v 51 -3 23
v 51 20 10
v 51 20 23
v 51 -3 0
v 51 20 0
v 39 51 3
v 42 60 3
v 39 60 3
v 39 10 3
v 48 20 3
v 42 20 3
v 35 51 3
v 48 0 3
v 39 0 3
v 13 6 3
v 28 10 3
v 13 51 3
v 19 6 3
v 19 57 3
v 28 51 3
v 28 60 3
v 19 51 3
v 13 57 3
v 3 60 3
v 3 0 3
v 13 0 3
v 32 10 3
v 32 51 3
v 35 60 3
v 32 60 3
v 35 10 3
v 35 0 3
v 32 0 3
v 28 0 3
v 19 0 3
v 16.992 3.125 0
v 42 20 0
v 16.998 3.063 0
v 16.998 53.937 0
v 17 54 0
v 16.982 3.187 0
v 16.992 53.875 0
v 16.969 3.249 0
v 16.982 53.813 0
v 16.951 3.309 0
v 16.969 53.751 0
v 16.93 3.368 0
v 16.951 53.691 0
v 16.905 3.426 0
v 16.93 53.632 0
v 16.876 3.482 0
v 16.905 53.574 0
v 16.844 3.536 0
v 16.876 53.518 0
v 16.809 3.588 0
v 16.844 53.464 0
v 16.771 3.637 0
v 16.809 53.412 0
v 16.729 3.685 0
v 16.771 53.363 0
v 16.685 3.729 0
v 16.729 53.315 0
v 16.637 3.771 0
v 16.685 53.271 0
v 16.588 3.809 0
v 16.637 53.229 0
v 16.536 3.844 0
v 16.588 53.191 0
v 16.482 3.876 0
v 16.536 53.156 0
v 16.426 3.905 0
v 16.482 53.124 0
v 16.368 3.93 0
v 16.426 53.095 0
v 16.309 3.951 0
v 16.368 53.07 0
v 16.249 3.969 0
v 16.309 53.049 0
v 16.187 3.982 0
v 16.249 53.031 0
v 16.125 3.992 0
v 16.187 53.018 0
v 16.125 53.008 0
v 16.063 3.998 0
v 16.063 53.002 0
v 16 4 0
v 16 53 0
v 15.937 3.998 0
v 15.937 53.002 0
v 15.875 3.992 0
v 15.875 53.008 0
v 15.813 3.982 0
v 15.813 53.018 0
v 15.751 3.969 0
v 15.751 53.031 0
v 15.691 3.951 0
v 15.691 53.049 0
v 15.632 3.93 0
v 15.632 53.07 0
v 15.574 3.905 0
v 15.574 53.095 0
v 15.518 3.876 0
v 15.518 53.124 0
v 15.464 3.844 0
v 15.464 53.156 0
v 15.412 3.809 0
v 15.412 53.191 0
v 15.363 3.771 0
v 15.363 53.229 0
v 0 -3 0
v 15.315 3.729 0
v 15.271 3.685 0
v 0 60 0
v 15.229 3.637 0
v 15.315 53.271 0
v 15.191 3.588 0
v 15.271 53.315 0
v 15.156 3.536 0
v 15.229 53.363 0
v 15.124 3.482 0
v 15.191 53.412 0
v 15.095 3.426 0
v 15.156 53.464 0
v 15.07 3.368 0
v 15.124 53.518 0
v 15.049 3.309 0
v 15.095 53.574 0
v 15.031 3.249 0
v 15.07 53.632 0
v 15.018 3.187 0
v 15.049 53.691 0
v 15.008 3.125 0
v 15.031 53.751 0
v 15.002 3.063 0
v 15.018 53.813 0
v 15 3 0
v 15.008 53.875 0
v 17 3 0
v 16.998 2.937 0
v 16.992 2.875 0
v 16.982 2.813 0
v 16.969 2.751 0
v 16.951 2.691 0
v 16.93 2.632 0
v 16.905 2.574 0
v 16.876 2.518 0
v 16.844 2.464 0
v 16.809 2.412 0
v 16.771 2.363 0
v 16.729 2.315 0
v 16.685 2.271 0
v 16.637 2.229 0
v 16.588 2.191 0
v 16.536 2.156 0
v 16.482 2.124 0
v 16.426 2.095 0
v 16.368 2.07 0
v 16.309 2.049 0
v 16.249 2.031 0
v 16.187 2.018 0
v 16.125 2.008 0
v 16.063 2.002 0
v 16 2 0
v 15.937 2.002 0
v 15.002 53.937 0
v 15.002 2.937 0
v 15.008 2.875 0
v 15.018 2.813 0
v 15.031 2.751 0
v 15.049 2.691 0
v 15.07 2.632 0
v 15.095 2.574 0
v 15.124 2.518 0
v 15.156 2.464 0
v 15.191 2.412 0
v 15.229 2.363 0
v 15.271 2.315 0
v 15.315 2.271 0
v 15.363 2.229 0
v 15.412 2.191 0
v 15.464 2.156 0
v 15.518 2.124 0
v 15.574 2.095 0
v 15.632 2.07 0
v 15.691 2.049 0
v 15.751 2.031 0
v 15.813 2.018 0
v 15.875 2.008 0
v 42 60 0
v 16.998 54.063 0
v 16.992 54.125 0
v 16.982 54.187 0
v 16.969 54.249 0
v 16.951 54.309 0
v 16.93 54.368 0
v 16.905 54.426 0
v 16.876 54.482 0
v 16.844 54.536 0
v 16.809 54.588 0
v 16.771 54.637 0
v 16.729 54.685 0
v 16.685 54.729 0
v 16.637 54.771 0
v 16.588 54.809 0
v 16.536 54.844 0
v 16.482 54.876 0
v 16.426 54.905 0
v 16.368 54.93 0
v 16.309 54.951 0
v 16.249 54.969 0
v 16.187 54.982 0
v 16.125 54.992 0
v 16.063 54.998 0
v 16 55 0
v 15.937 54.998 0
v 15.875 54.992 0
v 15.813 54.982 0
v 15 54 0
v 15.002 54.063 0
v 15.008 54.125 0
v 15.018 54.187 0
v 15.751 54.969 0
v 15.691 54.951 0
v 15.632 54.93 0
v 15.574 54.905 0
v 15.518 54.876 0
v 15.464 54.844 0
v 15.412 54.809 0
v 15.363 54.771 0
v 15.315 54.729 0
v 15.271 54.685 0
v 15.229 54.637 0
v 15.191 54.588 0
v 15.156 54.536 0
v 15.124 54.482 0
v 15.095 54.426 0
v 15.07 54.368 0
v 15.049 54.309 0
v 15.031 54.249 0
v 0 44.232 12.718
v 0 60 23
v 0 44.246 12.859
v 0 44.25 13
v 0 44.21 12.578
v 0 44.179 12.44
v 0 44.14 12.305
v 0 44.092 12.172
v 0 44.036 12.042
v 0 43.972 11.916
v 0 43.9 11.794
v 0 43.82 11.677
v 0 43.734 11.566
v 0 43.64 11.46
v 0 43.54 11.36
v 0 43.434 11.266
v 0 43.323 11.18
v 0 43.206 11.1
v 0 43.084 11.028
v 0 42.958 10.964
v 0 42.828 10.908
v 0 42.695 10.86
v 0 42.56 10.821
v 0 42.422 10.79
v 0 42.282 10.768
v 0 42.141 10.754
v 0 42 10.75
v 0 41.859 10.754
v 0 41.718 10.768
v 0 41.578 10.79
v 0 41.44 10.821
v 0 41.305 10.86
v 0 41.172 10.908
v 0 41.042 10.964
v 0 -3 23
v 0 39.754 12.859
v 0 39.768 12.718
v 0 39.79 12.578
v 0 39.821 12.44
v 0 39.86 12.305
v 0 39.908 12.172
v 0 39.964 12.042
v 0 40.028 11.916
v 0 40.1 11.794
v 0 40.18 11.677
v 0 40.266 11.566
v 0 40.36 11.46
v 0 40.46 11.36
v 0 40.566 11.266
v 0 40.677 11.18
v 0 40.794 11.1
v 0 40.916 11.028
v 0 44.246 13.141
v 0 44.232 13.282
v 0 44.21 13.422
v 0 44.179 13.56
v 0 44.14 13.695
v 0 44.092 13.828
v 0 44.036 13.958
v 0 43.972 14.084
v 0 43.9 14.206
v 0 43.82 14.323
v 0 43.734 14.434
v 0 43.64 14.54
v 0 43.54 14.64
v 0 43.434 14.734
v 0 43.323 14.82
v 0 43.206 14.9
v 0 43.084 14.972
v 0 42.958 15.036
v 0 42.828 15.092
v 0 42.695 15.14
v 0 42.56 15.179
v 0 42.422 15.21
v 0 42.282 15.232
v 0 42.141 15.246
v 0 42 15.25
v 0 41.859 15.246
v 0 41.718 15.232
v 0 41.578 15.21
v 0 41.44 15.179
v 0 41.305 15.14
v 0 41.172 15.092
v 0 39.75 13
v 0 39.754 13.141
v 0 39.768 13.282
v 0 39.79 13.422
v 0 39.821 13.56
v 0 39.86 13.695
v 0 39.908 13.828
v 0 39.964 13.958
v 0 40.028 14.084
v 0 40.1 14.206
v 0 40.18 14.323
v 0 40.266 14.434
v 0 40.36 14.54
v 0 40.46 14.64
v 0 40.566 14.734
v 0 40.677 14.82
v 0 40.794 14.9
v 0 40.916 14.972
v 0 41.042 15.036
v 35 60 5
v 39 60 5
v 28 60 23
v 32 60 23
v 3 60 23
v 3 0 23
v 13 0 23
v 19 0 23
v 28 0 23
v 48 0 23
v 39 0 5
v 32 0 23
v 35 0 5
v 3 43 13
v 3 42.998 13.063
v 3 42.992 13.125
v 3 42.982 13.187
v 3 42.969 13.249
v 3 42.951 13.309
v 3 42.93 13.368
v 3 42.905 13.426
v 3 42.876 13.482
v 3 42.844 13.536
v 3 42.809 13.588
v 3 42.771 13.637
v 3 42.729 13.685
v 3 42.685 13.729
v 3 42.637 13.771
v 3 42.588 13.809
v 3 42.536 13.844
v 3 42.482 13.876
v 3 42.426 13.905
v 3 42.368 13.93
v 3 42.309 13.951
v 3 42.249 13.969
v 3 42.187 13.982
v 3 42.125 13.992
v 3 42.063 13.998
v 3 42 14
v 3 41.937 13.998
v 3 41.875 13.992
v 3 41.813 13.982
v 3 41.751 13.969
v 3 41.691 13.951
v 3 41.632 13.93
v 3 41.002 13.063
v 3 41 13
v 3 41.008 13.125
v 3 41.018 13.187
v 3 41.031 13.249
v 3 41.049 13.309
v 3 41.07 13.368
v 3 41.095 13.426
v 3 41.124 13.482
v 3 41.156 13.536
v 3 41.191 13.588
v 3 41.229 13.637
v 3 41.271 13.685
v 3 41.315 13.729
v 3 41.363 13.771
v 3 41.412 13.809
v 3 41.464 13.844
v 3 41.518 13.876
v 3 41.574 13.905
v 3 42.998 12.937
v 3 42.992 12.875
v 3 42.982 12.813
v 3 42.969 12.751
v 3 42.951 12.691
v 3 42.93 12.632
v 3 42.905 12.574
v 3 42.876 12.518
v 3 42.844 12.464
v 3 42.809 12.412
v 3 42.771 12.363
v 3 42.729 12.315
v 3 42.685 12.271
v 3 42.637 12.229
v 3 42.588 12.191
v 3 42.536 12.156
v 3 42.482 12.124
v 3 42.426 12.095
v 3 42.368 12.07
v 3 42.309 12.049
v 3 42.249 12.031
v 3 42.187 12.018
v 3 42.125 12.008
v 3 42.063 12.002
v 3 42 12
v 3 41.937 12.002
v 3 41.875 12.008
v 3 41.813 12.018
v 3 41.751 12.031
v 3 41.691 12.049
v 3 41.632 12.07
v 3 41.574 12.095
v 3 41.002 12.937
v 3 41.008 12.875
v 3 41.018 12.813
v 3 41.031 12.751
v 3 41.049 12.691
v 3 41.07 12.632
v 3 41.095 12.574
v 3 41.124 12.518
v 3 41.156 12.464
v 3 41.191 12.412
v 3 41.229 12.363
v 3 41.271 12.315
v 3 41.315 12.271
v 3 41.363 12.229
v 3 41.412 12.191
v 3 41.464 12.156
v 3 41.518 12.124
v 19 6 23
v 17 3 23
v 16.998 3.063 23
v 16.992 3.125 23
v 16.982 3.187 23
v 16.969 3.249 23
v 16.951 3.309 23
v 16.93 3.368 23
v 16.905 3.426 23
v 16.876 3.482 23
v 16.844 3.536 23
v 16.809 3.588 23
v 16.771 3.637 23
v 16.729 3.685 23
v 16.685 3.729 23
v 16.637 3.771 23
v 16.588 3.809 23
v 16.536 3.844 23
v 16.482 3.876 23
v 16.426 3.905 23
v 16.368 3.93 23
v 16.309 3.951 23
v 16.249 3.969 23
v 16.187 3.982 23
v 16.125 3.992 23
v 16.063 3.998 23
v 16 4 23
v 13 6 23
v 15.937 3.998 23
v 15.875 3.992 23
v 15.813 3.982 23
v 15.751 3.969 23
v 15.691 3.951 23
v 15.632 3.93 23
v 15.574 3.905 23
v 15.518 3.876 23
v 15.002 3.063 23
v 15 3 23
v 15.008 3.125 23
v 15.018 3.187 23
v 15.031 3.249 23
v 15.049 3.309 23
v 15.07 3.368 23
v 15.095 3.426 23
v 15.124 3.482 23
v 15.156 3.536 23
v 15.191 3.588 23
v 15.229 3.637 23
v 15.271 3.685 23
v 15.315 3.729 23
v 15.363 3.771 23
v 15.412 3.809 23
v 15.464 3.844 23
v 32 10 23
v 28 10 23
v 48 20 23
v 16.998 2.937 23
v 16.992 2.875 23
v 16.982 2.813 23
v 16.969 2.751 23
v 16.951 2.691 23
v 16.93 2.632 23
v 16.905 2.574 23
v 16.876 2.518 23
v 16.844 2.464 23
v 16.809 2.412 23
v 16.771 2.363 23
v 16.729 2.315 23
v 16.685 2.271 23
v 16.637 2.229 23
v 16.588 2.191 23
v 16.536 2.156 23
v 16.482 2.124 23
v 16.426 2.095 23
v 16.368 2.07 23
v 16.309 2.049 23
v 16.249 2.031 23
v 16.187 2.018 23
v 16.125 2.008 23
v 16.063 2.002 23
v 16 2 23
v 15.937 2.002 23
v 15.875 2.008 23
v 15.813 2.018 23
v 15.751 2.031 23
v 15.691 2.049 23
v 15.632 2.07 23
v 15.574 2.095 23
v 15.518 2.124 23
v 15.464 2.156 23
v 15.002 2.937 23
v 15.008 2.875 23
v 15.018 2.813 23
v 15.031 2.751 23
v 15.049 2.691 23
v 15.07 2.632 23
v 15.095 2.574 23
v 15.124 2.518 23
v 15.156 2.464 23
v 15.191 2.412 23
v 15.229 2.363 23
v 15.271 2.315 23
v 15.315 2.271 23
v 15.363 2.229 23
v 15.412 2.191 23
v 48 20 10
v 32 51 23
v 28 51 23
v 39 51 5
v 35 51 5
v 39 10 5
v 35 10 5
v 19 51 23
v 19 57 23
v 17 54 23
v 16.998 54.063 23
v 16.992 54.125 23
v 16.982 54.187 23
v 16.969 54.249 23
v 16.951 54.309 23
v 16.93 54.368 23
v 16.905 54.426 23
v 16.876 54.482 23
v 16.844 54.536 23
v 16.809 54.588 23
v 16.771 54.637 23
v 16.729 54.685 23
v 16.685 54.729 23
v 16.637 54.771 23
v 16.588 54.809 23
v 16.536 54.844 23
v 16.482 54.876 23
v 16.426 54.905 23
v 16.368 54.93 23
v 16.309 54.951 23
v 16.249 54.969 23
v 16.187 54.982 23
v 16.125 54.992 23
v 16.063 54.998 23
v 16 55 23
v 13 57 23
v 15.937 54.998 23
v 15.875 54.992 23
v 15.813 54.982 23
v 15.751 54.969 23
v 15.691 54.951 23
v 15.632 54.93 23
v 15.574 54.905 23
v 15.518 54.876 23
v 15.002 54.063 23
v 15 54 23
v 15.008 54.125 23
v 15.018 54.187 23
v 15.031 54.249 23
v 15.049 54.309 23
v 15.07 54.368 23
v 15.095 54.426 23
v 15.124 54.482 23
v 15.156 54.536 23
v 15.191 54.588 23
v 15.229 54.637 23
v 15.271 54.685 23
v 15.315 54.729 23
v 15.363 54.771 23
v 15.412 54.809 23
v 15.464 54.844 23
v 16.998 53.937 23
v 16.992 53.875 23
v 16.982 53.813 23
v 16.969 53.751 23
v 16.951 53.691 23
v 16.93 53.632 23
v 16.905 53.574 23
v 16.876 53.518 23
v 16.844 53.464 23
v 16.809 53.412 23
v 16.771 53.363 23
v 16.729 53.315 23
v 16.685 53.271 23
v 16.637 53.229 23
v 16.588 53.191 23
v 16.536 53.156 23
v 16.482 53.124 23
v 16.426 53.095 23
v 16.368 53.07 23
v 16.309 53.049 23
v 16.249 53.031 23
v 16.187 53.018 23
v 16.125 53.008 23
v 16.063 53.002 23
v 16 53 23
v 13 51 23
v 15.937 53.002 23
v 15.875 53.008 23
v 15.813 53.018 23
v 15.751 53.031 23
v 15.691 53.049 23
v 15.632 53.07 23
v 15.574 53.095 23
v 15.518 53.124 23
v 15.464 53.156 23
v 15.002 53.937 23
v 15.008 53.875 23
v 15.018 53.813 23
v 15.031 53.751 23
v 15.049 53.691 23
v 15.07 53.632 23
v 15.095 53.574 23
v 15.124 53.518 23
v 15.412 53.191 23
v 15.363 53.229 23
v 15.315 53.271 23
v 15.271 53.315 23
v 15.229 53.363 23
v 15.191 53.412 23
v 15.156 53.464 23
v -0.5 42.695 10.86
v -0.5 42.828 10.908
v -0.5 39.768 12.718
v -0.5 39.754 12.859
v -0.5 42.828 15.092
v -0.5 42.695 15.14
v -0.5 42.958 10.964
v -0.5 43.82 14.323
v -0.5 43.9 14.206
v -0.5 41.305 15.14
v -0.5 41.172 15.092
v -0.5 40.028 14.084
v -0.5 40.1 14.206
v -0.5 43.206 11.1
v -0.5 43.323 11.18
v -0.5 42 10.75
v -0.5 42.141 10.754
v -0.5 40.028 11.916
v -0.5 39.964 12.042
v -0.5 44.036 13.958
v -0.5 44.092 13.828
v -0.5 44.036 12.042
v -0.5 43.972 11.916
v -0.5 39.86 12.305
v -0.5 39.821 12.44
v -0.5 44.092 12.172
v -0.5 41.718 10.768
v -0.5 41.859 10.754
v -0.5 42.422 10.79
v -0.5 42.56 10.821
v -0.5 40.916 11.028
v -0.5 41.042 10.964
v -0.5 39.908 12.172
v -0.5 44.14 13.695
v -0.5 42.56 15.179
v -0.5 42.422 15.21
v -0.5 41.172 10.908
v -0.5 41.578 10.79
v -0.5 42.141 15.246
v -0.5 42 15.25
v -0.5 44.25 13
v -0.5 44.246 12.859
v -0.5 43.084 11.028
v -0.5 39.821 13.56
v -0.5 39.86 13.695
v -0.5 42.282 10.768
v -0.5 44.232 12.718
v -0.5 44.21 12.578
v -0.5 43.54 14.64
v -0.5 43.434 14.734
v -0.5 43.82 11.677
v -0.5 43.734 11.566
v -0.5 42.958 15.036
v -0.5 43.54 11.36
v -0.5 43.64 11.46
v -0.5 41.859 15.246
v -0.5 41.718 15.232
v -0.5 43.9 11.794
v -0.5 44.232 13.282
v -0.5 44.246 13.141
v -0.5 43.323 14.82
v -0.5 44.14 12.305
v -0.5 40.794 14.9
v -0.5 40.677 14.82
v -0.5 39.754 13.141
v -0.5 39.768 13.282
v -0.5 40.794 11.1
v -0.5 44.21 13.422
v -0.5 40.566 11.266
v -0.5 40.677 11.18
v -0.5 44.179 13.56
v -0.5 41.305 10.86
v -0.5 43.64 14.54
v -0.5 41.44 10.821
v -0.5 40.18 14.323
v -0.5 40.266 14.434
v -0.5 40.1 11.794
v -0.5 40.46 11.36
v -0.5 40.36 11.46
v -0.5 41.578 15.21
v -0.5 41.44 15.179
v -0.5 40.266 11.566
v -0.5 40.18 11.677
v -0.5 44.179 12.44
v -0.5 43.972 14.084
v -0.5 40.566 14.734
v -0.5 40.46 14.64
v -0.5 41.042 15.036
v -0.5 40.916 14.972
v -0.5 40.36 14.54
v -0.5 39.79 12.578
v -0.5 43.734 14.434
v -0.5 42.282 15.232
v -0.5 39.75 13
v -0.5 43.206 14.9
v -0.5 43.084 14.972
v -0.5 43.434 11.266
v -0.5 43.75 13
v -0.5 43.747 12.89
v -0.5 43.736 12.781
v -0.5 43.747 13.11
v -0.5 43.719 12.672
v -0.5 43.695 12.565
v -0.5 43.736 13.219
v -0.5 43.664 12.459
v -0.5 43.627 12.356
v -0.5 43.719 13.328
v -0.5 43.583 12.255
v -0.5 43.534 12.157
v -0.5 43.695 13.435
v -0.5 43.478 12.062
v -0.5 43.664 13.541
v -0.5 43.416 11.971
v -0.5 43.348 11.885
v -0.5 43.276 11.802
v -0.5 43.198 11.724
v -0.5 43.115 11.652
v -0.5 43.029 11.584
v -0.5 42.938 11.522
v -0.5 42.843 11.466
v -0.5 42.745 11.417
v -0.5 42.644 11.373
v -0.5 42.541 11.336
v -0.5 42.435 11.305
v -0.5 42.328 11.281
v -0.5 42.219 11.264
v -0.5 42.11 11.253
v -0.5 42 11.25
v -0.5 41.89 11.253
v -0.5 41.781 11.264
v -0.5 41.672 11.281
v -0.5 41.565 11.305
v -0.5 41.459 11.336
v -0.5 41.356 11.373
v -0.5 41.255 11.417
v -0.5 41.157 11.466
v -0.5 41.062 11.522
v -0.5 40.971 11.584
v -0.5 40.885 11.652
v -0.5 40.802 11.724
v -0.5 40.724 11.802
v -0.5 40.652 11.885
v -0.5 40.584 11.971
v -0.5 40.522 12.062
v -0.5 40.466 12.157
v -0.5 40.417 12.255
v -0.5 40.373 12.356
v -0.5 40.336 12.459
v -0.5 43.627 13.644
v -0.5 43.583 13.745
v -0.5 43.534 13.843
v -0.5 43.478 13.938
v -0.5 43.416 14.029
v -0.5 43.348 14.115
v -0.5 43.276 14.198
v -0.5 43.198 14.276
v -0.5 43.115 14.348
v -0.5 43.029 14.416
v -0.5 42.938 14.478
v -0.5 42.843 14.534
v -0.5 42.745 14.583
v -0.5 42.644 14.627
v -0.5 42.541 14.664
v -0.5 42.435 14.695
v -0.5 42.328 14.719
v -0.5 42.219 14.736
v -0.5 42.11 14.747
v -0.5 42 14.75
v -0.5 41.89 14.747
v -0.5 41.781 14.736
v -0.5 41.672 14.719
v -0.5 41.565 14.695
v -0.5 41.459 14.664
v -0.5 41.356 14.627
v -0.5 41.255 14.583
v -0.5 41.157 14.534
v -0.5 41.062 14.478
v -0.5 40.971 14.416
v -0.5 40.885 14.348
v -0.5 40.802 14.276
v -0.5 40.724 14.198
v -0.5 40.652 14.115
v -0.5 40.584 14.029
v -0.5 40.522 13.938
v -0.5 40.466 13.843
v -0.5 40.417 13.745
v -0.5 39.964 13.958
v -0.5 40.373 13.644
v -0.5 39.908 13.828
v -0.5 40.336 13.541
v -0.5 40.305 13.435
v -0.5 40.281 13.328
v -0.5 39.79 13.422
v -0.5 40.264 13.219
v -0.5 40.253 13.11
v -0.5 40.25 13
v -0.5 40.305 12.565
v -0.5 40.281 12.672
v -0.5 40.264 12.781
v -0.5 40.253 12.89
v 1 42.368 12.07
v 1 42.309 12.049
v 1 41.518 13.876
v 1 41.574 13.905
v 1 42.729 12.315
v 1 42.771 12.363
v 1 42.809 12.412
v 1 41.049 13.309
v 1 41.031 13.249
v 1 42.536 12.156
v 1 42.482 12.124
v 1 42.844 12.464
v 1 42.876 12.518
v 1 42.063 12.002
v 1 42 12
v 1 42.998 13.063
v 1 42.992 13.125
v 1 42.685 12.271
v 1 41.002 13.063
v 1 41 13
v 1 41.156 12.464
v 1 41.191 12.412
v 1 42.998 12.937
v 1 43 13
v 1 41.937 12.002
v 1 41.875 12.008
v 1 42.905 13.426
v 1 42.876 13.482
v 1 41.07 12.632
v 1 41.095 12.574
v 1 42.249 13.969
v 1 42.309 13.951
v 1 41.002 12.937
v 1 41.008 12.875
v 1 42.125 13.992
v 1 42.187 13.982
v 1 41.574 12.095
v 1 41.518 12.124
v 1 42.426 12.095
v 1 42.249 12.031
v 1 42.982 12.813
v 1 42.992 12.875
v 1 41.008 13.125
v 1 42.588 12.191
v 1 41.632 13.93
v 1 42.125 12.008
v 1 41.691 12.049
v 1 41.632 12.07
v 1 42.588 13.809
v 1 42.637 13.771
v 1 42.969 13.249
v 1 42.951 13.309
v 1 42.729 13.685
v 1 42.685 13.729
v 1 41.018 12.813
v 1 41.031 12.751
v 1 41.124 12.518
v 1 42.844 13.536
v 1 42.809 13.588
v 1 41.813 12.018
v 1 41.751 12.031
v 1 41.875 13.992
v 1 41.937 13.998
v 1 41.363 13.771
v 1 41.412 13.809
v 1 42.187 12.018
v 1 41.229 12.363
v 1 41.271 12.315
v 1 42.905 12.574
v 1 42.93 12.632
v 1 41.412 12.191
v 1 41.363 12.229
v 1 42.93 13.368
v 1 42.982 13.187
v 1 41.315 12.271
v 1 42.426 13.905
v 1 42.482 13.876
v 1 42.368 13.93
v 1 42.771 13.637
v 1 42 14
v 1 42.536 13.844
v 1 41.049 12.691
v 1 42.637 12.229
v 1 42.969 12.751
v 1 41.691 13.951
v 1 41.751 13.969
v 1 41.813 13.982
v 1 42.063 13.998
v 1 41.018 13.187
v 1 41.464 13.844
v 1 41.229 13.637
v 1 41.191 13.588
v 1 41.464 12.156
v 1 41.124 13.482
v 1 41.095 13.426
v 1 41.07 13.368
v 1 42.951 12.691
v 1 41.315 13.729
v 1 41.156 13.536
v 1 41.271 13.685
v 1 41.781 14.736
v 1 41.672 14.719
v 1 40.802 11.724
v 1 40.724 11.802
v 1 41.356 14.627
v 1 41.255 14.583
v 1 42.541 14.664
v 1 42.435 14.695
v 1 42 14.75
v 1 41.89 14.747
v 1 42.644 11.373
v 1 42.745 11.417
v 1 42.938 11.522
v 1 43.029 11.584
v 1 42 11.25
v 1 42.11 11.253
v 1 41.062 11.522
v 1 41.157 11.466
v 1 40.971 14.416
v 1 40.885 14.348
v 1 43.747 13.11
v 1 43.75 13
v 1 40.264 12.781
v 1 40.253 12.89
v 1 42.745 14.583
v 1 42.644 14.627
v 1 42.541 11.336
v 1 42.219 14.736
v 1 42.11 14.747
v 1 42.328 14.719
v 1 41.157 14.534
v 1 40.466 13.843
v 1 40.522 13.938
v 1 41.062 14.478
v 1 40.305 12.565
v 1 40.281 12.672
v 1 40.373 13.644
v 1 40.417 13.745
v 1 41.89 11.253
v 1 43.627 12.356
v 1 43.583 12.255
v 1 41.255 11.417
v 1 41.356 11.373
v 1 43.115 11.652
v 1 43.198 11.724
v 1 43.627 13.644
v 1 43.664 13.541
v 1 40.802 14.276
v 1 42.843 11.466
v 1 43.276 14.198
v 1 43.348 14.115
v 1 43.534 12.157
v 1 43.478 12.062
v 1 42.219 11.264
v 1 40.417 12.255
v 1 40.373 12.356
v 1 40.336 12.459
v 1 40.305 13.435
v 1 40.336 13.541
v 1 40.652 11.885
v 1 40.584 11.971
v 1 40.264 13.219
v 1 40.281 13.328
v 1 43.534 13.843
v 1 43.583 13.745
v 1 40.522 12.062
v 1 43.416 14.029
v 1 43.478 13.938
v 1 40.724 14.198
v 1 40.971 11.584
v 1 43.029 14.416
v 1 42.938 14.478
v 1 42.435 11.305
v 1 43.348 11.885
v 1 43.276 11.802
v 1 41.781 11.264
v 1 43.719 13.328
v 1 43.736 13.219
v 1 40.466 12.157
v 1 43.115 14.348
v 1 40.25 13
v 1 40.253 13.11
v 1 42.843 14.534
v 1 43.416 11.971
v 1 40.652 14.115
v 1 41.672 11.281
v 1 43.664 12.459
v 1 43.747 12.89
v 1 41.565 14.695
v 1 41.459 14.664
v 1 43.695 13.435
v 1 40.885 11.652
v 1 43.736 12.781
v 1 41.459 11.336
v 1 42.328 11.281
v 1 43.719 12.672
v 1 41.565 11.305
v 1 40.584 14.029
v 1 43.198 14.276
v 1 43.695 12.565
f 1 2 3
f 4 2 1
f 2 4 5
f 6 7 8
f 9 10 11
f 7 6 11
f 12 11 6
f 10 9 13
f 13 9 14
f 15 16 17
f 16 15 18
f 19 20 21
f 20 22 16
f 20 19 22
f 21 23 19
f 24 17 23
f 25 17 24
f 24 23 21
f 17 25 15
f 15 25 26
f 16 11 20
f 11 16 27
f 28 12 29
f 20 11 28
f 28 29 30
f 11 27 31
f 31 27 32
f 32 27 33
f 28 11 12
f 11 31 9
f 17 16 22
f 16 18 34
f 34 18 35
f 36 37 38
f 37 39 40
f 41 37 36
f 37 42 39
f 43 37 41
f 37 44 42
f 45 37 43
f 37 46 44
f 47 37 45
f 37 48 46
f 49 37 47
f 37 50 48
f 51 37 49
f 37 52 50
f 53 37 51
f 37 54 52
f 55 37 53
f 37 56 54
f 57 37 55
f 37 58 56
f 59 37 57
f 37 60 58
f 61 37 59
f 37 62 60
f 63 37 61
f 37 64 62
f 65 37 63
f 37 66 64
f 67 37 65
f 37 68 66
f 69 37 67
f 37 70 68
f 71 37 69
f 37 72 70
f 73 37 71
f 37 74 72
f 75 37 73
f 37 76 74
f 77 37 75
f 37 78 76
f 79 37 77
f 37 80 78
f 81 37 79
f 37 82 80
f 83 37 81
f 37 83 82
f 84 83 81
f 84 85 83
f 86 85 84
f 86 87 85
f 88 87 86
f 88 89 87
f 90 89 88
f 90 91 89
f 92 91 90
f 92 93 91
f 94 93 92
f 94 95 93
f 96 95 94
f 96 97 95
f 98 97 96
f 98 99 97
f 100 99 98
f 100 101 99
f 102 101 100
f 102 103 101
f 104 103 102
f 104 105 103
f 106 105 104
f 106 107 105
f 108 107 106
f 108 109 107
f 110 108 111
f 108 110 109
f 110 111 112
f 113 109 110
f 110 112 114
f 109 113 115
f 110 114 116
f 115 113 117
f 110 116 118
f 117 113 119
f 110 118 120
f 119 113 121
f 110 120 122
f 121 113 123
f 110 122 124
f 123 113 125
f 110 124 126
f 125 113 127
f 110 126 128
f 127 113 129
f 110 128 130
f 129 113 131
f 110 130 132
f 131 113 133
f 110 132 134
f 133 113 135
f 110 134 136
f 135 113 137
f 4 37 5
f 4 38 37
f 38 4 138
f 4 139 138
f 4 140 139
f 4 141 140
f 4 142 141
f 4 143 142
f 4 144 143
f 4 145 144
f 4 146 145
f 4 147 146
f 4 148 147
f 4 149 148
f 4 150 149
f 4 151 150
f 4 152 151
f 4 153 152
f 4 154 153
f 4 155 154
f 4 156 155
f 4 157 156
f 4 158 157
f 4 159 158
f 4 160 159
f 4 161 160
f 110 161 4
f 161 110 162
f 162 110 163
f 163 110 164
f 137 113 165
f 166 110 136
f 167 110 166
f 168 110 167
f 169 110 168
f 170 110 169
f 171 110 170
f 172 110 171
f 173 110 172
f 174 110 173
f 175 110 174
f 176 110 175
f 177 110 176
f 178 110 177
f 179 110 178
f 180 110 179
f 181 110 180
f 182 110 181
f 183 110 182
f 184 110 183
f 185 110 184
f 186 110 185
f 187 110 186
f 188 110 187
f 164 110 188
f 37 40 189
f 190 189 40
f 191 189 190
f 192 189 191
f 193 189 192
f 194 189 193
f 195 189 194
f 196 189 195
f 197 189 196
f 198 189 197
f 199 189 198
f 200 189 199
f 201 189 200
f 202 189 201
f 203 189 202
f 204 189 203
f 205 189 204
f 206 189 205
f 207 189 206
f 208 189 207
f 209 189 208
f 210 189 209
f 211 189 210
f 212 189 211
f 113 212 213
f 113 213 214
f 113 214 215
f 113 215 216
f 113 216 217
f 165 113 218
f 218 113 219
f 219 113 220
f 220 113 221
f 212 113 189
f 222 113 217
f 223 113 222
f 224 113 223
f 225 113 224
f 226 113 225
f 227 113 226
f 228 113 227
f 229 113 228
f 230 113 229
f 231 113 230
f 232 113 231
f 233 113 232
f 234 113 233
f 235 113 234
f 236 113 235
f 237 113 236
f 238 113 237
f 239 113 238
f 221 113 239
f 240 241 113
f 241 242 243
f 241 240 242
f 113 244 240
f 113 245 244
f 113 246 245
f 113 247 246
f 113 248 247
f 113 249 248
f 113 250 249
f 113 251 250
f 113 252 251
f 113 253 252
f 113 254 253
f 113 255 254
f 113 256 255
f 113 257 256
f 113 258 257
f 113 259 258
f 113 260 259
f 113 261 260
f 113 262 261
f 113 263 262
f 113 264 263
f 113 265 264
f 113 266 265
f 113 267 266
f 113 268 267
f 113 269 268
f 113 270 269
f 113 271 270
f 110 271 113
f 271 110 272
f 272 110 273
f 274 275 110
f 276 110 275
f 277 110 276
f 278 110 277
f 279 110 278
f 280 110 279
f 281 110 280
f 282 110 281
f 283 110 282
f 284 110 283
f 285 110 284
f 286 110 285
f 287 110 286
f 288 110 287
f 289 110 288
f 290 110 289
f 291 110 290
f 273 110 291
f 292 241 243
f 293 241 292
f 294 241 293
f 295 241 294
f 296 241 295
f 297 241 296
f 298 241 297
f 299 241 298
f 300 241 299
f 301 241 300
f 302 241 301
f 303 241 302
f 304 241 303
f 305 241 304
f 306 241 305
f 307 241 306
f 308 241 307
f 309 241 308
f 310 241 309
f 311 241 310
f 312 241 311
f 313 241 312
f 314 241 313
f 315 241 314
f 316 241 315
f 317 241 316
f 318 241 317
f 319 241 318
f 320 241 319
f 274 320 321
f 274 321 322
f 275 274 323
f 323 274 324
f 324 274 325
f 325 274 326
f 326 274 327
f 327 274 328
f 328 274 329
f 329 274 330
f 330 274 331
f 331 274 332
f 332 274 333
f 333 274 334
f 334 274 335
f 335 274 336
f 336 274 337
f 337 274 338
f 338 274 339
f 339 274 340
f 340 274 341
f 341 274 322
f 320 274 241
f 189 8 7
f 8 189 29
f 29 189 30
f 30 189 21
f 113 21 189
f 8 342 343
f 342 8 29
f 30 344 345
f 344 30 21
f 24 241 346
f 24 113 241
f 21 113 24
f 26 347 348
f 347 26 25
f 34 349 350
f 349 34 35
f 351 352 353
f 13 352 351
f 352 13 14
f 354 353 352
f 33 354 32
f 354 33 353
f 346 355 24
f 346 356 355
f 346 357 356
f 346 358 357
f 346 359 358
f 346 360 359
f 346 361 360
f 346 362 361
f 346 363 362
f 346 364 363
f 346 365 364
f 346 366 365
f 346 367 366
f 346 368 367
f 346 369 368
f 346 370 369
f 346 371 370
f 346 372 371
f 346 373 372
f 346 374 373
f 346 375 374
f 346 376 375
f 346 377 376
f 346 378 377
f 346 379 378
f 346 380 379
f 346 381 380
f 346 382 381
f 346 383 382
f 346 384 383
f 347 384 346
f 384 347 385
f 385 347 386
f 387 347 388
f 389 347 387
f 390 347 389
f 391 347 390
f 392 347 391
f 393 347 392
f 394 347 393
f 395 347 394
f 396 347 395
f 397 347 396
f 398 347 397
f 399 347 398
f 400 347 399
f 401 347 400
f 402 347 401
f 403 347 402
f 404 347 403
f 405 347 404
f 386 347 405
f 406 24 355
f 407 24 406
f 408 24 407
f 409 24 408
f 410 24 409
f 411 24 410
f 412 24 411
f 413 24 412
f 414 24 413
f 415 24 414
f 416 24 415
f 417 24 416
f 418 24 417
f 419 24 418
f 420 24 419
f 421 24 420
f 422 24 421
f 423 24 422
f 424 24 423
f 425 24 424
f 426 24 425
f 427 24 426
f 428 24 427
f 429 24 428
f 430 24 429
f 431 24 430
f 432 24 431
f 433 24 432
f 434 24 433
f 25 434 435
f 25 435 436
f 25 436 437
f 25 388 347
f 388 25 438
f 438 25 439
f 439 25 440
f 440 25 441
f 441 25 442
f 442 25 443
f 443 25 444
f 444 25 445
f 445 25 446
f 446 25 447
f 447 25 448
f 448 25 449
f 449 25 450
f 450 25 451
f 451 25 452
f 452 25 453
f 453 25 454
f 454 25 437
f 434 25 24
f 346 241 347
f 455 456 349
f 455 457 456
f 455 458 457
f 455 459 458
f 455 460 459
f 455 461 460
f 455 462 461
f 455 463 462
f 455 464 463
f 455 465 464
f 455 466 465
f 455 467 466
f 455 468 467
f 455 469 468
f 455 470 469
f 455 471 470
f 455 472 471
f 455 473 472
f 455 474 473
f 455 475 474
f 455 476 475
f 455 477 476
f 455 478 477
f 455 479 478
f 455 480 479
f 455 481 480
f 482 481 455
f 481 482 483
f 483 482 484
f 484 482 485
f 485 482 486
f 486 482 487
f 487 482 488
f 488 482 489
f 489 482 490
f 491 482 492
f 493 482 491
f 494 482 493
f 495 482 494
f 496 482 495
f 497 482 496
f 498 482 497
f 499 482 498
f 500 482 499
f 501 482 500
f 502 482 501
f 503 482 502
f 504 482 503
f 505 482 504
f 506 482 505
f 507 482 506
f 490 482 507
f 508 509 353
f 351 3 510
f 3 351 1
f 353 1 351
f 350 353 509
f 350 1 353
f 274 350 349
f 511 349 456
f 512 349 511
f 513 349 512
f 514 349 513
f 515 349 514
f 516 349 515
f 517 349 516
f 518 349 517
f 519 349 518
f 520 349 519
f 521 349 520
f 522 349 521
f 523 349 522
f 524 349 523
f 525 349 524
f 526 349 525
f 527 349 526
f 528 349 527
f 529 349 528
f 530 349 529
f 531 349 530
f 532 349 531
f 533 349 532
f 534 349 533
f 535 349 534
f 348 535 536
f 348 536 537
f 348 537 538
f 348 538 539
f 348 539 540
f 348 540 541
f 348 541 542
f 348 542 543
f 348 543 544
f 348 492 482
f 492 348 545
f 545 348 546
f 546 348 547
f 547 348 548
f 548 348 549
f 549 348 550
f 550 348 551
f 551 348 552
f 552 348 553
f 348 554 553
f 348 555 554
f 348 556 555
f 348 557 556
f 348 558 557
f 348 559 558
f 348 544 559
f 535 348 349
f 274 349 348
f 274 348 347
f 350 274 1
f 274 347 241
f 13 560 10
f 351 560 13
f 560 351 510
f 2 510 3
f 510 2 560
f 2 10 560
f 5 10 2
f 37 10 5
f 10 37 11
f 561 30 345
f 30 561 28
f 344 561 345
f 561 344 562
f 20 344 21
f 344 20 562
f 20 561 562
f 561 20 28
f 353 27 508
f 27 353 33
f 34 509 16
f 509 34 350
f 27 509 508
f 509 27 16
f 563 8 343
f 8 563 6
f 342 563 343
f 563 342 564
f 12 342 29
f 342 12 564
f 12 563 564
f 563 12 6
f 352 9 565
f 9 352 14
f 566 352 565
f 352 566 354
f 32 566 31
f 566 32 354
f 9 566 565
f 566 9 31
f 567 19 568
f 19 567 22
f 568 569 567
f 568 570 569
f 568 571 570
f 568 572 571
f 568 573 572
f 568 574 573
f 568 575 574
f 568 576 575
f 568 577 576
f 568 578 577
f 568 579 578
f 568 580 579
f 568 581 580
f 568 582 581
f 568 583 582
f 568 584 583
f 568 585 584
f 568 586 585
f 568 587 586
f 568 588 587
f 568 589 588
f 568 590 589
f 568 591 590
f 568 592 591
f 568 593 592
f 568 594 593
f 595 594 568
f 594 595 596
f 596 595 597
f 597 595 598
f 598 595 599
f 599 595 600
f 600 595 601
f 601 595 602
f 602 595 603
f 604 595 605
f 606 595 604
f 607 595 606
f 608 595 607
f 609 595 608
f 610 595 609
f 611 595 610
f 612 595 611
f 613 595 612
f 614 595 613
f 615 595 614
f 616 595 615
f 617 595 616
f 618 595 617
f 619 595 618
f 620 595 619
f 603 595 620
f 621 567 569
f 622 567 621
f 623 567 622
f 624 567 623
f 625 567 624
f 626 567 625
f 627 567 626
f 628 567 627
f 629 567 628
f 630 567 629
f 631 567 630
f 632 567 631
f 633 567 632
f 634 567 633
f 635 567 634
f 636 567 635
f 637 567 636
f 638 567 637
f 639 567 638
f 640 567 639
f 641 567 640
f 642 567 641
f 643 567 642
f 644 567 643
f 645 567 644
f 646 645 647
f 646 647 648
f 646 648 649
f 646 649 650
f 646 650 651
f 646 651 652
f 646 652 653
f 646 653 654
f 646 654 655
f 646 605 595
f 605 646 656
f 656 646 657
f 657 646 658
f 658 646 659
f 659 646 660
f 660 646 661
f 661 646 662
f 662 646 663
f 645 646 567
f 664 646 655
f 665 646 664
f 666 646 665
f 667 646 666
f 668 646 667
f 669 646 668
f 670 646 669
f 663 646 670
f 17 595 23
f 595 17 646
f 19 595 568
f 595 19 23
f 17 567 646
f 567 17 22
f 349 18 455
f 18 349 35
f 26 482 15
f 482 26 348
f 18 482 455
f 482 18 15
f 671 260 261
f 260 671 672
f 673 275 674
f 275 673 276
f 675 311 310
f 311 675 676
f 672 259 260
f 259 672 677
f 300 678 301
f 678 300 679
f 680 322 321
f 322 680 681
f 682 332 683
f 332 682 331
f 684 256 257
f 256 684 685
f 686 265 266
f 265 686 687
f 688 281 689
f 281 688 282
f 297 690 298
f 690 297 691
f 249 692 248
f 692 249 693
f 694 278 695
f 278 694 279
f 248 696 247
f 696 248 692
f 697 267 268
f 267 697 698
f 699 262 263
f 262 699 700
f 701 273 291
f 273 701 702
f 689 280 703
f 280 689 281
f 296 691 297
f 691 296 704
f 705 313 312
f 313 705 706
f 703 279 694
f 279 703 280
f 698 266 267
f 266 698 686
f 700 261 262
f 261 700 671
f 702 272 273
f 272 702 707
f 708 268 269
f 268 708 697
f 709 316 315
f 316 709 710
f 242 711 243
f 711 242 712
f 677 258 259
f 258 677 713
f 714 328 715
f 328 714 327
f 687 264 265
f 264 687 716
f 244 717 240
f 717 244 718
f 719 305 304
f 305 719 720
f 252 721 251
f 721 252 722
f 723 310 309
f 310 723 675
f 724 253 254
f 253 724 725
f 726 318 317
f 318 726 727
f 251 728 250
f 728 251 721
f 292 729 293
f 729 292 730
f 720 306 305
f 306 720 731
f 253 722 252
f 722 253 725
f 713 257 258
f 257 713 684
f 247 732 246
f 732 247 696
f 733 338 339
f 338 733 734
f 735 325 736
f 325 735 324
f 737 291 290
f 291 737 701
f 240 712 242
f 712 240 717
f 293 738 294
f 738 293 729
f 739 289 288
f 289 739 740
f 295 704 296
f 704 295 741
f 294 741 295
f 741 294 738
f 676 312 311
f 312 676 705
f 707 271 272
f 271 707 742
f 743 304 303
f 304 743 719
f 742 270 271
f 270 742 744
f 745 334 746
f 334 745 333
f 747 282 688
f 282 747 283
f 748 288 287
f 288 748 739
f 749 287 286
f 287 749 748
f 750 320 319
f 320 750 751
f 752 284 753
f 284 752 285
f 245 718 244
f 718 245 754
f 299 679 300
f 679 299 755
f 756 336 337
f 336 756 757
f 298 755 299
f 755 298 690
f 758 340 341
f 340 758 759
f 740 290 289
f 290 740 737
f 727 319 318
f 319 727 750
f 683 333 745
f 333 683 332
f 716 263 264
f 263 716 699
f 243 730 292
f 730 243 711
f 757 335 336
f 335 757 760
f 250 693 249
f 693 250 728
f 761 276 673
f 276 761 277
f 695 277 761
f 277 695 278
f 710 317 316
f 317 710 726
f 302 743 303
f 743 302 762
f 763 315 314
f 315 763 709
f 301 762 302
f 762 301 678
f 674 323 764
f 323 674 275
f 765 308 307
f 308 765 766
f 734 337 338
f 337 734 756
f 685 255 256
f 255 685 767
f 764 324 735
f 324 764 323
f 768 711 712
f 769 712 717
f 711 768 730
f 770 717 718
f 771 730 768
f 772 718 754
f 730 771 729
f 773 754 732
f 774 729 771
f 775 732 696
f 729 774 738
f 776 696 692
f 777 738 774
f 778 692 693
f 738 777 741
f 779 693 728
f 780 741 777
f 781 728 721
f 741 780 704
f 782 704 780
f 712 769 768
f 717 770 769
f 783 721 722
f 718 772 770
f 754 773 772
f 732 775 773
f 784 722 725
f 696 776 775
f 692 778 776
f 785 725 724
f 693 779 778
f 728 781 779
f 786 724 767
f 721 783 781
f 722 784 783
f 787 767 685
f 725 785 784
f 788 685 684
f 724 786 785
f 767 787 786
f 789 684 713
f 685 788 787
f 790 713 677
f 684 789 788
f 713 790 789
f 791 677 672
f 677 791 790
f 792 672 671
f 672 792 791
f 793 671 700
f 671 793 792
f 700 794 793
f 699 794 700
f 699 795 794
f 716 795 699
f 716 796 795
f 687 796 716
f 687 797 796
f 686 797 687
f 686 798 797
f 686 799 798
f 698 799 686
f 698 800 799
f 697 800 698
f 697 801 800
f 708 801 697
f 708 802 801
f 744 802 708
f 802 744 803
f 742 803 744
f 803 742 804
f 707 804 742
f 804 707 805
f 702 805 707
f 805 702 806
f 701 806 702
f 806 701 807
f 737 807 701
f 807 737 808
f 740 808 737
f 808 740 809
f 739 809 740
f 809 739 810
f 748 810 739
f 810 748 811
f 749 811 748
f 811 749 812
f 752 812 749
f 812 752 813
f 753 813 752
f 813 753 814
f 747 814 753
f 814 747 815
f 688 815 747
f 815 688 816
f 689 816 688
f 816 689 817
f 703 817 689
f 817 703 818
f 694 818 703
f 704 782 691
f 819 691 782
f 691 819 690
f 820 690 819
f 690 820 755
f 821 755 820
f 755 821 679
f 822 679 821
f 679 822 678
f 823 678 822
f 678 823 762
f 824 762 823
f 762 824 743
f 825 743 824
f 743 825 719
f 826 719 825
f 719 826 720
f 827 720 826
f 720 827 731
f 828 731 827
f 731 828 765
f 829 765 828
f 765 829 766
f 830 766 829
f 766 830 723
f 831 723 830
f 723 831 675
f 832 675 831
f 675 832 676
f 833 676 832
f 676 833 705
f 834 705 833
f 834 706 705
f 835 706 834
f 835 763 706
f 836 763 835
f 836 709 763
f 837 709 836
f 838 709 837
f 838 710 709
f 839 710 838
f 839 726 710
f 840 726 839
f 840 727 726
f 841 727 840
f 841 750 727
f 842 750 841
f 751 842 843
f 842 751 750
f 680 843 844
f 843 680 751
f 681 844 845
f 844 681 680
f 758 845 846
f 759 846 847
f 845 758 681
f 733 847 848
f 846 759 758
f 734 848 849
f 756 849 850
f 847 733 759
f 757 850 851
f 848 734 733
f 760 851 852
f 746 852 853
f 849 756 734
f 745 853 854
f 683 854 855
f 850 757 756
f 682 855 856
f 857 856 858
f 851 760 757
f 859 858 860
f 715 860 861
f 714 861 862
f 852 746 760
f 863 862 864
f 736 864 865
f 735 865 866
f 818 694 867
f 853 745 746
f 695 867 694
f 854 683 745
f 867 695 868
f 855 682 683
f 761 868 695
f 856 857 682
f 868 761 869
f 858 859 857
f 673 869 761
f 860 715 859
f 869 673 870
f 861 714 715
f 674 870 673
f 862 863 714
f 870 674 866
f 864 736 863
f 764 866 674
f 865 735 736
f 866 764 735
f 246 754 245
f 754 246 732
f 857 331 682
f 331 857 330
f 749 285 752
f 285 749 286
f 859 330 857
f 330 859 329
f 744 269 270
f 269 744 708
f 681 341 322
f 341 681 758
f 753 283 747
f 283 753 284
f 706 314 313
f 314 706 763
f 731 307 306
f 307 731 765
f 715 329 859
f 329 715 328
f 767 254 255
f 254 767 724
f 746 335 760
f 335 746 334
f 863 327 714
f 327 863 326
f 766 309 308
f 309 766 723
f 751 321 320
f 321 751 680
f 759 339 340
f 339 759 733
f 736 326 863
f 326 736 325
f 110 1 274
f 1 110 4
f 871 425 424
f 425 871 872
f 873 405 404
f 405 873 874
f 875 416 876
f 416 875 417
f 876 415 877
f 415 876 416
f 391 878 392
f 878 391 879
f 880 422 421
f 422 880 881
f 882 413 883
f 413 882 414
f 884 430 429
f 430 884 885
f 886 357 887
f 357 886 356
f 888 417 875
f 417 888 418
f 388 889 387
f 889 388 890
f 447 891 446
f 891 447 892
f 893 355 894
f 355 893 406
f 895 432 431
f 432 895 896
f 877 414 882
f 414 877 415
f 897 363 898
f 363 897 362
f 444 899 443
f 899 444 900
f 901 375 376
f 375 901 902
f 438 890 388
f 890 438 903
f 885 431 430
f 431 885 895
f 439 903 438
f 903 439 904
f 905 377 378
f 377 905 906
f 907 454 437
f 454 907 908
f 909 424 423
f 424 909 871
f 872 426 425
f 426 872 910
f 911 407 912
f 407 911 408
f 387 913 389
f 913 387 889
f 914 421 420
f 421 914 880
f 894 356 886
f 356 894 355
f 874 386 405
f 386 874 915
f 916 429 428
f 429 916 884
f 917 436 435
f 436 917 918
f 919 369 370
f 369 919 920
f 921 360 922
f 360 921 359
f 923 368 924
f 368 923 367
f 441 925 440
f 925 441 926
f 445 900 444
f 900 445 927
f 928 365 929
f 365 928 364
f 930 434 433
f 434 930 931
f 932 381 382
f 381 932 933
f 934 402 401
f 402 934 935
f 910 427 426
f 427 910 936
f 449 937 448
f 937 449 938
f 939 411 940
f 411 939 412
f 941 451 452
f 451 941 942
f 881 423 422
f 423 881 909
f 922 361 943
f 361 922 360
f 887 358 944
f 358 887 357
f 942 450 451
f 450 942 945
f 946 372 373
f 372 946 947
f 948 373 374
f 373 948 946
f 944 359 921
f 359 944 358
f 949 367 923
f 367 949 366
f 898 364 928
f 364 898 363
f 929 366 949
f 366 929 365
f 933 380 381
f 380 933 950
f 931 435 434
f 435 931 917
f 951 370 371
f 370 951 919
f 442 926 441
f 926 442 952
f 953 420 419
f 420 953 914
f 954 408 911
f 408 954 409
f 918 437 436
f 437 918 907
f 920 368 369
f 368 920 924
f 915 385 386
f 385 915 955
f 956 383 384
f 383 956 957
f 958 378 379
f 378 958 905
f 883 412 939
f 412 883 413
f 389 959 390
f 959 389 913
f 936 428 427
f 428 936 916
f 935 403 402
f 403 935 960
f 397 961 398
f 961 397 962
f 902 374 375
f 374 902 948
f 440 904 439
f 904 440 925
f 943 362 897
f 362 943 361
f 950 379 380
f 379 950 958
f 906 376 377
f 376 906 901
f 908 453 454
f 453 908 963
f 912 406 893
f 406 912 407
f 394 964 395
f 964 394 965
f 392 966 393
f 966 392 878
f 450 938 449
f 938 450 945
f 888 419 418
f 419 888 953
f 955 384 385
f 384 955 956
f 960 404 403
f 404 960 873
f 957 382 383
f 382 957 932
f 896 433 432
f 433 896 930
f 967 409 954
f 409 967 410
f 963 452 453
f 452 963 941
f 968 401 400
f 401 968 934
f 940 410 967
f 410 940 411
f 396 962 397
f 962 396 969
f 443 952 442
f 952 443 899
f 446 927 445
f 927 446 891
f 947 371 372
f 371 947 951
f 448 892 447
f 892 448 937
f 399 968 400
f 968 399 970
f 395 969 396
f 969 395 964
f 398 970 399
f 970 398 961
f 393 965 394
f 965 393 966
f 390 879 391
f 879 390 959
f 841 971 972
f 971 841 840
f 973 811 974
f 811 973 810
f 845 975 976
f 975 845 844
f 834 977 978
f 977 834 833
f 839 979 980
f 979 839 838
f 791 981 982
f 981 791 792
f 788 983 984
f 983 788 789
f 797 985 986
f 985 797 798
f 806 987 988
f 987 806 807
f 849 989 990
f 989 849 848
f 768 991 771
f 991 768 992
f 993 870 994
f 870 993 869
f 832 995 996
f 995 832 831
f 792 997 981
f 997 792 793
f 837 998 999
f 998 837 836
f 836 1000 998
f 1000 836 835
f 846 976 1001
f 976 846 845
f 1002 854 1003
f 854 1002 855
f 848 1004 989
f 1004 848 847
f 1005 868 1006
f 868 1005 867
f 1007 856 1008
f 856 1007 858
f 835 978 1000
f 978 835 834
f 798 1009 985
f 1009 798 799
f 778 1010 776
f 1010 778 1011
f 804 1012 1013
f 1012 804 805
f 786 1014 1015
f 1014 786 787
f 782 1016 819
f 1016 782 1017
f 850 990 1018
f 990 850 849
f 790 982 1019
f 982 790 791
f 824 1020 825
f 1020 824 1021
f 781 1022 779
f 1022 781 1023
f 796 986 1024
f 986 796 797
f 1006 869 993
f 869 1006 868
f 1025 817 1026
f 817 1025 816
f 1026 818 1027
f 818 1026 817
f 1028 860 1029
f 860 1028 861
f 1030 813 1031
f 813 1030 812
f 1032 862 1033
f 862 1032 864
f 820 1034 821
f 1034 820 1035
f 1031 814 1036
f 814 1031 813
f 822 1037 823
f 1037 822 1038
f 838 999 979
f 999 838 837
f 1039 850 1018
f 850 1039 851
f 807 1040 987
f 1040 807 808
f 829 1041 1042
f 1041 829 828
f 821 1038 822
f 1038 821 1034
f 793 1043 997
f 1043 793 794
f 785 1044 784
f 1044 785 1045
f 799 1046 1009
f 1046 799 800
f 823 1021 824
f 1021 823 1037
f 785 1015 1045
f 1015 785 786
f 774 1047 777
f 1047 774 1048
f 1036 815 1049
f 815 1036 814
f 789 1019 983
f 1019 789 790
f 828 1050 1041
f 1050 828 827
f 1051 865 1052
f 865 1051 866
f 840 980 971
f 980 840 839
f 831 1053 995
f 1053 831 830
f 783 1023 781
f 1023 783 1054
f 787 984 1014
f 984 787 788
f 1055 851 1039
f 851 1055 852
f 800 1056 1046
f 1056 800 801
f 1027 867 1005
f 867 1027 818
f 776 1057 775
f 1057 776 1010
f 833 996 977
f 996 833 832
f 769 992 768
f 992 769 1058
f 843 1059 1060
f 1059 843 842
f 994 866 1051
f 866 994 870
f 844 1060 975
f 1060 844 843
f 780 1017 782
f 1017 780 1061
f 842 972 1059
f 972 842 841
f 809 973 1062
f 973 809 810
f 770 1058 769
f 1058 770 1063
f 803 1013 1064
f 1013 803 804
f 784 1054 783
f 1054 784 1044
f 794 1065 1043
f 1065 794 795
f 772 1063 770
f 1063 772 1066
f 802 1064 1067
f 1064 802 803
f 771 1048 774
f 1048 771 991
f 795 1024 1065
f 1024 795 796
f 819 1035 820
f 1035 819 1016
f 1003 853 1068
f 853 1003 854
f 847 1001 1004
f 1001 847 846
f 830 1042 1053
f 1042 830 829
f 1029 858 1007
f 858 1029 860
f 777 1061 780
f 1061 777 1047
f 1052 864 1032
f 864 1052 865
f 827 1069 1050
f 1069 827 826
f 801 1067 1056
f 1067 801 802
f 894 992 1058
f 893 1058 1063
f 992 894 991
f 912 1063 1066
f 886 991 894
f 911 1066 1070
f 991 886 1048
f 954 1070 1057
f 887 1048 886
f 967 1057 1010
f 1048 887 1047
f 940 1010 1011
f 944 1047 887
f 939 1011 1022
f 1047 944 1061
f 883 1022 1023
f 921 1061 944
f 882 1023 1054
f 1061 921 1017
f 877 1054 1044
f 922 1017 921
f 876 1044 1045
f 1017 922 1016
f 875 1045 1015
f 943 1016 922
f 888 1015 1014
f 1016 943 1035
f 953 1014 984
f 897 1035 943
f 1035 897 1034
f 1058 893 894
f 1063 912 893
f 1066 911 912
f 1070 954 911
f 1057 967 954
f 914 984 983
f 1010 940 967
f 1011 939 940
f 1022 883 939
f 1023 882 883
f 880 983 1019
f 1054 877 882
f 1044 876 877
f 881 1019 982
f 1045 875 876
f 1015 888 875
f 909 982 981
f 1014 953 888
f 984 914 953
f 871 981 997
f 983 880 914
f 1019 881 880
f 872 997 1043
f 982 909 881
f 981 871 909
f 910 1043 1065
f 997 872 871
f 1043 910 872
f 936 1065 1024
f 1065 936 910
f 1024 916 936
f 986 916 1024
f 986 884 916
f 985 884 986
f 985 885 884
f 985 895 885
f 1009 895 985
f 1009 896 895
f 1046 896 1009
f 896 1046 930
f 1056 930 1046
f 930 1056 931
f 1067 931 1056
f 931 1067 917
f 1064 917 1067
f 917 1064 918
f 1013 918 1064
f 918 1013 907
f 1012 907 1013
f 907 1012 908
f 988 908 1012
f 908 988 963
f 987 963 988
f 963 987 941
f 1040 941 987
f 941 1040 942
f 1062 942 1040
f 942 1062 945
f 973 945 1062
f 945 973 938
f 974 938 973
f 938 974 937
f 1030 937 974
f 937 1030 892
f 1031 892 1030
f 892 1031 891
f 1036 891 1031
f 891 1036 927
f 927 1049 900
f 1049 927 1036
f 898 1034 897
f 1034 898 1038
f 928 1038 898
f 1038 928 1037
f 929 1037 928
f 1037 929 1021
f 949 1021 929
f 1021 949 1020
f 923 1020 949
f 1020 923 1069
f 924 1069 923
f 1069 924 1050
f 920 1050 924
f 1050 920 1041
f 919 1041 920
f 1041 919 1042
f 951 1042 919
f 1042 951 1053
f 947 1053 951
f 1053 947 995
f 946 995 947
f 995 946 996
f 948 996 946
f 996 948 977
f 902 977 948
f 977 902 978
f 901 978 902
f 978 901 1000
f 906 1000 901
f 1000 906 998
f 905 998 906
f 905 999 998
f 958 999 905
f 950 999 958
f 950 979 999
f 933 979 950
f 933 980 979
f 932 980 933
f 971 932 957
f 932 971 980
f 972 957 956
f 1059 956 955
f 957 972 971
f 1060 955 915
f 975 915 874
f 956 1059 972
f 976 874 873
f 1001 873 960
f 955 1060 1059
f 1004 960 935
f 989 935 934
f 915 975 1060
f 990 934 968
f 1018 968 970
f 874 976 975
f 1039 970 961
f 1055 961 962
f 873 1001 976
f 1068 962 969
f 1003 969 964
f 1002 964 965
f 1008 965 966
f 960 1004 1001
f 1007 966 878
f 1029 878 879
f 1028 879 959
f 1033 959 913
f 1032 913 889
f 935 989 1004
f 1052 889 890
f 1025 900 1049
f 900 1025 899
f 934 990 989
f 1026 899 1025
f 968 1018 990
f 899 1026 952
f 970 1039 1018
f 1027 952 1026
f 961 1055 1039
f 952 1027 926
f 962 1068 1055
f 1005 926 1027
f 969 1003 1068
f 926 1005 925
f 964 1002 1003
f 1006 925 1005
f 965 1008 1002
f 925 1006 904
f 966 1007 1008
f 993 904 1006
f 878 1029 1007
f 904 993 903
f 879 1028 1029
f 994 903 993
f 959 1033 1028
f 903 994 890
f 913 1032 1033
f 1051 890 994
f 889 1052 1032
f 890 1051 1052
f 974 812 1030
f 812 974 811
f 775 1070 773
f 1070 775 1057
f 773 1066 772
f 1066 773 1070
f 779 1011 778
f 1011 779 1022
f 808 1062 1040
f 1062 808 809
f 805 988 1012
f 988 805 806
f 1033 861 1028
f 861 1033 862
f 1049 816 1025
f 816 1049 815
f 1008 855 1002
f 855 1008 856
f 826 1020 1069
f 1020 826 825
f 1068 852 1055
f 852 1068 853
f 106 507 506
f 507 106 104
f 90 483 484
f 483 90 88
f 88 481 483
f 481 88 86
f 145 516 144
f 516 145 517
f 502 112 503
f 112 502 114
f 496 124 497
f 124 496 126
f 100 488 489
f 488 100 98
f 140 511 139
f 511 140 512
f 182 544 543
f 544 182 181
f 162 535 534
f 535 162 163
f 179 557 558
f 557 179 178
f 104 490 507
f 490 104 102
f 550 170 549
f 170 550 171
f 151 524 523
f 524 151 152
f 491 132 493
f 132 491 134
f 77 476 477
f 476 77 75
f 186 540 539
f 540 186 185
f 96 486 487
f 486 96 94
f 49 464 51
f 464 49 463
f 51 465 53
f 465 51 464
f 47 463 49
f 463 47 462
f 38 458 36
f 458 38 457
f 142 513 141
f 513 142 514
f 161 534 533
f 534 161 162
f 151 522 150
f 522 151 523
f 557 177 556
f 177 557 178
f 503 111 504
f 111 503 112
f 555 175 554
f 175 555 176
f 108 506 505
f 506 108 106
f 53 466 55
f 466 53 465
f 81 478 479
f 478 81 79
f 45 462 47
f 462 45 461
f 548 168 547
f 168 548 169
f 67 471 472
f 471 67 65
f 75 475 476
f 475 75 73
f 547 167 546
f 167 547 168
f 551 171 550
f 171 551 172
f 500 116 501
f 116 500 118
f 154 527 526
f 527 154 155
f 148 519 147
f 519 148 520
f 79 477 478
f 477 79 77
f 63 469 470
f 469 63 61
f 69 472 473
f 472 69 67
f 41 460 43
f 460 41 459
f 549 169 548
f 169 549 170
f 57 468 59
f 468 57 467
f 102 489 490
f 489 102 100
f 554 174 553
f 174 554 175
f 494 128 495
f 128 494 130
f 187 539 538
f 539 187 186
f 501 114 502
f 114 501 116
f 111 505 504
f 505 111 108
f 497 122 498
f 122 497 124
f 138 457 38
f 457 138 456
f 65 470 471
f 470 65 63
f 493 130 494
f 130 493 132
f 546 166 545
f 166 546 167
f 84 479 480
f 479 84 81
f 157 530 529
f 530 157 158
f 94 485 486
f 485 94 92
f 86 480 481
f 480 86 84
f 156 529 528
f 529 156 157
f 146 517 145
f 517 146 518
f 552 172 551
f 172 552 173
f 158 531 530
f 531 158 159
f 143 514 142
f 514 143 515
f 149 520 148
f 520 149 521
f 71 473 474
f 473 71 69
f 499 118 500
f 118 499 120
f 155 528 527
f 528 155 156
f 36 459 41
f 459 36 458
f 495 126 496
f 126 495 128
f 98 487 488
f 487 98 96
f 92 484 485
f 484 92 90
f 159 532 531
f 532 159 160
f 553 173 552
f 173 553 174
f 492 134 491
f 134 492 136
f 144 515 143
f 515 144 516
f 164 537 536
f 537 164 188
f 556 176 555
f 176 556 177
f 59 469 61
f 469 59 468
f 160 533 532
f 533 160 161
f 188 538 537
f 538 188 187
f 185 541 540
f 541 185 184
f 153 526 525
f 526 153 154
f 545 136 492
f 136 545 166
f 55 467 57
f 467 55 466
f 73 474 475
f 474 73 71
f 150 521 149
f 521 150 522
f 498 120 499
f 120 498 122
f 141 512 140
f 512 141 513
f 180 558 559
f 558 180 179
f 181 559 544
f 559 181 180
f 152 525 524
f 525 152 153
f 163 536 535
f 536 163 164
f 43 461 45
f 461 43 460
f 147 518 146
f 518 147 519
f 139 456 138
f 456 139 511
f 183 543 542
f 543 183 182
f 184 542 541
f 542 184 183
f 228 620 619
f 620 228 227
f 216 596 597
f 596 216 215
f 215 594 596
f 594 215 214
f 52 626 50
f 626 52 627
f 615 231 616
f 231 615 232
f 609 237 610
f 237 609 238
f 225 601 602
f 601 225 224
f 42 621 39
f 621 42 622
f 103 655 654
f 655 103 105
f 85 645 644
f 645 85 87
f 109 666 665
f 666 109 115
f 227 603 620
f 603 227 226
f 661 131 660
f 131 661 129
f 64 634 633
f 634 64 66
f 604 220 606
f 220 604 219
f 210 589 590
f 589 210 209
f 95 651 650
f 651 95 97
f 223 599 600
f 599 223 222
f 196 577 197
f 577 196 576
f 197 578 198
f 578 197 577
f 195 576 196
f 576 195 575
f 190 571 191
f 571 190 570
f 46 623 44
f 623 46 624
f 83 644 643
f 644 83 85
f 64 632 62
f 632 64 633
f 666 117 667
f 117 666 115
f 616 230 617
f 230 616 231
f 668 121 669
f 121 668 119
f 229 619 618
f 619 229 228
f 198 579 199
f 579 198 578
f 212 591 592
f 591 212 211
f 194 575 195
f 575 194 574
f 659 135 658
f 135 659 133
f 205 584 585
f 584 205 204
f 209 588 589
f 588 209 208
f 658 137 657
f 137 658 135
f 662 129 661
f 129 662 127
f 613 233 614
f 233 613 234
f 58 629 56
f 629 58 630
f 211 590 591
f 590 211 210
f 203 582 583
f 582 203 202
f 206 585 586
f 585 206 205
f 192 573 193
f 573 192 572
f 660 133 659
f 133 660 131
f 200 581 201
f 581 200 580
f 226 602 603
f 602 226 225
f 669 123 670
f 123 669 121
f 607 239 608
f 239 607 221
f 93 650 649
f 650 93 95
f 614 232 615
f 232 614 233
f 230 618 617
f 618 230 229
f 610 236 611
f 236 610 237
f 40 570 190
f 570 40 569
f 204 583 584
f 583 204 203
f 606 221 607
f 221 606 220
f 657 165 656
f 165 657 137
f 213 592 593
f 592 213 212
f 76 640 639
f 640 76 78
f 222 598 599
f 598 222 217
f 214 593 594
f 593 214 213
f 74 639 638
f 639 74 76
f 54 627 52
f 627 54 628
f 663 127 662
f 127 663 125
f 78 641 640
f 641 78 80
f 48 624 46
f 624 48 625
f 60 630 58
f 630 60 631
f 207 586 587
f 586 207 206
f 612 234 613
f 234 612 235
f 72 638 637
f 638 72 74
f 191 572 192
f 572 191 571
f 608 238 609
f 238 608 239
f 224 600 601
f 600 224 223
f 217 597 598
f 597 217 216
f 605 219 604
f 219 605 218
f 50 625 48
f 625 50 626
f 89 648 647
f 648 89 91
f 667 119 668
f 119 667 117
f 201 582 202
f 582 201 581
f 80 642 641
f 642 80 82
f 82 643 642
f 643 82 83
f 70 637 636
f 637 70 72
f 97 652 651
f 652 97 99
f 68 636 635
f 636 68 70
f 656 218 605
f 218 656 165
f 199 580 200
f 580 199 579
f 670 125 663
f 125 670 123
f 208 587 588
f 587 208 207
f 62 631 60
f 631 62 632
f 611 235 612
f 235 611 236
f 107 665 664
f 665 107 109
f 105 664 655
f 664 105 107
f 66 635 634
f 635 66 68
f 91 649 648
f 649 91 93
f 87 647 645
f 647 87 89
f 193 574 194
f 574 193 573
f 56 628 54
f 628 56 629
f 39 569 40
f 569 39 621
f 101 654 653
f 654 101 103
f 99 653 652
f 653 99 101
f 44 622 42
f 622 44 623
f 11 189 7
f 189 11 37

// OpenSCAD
difference(){

	union(){
        // testplaat
        translate([3,10,0]){
           //cube([29,41,5], center=false);
        }


        // onderplaat
        translate([0,0,0]){
           cube([51,60,3], center=false);
        }
        
        // linkerkant
        translate([0,0,0]){
          cube([3,60,23], center=false);
        }      
        // rechterkant
        translate([51-3,0,0]){
         cube([3,20,23], center=false);
        }      
        
        // steun rechtsvoor
        translate([28,51,0]){
          cube([4,9,23], center=false);
        }      
        // steun rechtsachter
        translate([28,0,0]){
          cube([4,10,23], center=false);
        }      
        // 2e steun rechtsvoor
        translate([35,51,0]){
          cube([4,9,5], center=false);
        }      
        // 2e steun rechtsachter
        translate([35,0,0]){
          cube([4,10,5], center=false);
        }      
        // steun linksvoor
        translate([13,41+10,0]){
          cube([6,6,23], center=false);
        }      
        // steun linksachter
        translate([13,0,0]){
          cube([6,6,23], center=false);
        }      
        
        translate([0,51-9,13]){
            rotate(a = [0,90,0]) {
                cylinder(h=1, r=2.25, $fn=100, center=true);
            }
        }	
   
        // achterplaat
        translate([0,-3,0]){
           cube([51,3,23], center=false);
        }     
        
	}
	union() {
        // gat in zijkanten (9.1mm)
       translate([0,51-9,13]){
            rotate(a = [0,90,0]) {
                cylinder(h=600, r=1, $fn=100, center=true);
            }
       }			   

        // gat in ring
        translate([0,51-9,13]){
            rotate(a = [0,90,0]) {
                cylinder(h=2, r=1.75, $fn=100, center=true);
            }
        }			   
       
       
       // gat in steun rechtsachter
       translate([16,3,0]){
            rotate(a = [0,0,90]) {
                cylinder(h=600, r=1, $fn=100, center=true);
            }
       }			   
       // gat in steun rechtsvoor
       translate([16,54,0]){
            rotate(a = [0,0,90]) {
                cylinder(h=600, r=1, $fn=100, center=true);
            }
       }	
       // uitsparing vloer
        translate([42,20,-10]){
          cube([20,50,20], center=false);
        }      

        
	}
}
